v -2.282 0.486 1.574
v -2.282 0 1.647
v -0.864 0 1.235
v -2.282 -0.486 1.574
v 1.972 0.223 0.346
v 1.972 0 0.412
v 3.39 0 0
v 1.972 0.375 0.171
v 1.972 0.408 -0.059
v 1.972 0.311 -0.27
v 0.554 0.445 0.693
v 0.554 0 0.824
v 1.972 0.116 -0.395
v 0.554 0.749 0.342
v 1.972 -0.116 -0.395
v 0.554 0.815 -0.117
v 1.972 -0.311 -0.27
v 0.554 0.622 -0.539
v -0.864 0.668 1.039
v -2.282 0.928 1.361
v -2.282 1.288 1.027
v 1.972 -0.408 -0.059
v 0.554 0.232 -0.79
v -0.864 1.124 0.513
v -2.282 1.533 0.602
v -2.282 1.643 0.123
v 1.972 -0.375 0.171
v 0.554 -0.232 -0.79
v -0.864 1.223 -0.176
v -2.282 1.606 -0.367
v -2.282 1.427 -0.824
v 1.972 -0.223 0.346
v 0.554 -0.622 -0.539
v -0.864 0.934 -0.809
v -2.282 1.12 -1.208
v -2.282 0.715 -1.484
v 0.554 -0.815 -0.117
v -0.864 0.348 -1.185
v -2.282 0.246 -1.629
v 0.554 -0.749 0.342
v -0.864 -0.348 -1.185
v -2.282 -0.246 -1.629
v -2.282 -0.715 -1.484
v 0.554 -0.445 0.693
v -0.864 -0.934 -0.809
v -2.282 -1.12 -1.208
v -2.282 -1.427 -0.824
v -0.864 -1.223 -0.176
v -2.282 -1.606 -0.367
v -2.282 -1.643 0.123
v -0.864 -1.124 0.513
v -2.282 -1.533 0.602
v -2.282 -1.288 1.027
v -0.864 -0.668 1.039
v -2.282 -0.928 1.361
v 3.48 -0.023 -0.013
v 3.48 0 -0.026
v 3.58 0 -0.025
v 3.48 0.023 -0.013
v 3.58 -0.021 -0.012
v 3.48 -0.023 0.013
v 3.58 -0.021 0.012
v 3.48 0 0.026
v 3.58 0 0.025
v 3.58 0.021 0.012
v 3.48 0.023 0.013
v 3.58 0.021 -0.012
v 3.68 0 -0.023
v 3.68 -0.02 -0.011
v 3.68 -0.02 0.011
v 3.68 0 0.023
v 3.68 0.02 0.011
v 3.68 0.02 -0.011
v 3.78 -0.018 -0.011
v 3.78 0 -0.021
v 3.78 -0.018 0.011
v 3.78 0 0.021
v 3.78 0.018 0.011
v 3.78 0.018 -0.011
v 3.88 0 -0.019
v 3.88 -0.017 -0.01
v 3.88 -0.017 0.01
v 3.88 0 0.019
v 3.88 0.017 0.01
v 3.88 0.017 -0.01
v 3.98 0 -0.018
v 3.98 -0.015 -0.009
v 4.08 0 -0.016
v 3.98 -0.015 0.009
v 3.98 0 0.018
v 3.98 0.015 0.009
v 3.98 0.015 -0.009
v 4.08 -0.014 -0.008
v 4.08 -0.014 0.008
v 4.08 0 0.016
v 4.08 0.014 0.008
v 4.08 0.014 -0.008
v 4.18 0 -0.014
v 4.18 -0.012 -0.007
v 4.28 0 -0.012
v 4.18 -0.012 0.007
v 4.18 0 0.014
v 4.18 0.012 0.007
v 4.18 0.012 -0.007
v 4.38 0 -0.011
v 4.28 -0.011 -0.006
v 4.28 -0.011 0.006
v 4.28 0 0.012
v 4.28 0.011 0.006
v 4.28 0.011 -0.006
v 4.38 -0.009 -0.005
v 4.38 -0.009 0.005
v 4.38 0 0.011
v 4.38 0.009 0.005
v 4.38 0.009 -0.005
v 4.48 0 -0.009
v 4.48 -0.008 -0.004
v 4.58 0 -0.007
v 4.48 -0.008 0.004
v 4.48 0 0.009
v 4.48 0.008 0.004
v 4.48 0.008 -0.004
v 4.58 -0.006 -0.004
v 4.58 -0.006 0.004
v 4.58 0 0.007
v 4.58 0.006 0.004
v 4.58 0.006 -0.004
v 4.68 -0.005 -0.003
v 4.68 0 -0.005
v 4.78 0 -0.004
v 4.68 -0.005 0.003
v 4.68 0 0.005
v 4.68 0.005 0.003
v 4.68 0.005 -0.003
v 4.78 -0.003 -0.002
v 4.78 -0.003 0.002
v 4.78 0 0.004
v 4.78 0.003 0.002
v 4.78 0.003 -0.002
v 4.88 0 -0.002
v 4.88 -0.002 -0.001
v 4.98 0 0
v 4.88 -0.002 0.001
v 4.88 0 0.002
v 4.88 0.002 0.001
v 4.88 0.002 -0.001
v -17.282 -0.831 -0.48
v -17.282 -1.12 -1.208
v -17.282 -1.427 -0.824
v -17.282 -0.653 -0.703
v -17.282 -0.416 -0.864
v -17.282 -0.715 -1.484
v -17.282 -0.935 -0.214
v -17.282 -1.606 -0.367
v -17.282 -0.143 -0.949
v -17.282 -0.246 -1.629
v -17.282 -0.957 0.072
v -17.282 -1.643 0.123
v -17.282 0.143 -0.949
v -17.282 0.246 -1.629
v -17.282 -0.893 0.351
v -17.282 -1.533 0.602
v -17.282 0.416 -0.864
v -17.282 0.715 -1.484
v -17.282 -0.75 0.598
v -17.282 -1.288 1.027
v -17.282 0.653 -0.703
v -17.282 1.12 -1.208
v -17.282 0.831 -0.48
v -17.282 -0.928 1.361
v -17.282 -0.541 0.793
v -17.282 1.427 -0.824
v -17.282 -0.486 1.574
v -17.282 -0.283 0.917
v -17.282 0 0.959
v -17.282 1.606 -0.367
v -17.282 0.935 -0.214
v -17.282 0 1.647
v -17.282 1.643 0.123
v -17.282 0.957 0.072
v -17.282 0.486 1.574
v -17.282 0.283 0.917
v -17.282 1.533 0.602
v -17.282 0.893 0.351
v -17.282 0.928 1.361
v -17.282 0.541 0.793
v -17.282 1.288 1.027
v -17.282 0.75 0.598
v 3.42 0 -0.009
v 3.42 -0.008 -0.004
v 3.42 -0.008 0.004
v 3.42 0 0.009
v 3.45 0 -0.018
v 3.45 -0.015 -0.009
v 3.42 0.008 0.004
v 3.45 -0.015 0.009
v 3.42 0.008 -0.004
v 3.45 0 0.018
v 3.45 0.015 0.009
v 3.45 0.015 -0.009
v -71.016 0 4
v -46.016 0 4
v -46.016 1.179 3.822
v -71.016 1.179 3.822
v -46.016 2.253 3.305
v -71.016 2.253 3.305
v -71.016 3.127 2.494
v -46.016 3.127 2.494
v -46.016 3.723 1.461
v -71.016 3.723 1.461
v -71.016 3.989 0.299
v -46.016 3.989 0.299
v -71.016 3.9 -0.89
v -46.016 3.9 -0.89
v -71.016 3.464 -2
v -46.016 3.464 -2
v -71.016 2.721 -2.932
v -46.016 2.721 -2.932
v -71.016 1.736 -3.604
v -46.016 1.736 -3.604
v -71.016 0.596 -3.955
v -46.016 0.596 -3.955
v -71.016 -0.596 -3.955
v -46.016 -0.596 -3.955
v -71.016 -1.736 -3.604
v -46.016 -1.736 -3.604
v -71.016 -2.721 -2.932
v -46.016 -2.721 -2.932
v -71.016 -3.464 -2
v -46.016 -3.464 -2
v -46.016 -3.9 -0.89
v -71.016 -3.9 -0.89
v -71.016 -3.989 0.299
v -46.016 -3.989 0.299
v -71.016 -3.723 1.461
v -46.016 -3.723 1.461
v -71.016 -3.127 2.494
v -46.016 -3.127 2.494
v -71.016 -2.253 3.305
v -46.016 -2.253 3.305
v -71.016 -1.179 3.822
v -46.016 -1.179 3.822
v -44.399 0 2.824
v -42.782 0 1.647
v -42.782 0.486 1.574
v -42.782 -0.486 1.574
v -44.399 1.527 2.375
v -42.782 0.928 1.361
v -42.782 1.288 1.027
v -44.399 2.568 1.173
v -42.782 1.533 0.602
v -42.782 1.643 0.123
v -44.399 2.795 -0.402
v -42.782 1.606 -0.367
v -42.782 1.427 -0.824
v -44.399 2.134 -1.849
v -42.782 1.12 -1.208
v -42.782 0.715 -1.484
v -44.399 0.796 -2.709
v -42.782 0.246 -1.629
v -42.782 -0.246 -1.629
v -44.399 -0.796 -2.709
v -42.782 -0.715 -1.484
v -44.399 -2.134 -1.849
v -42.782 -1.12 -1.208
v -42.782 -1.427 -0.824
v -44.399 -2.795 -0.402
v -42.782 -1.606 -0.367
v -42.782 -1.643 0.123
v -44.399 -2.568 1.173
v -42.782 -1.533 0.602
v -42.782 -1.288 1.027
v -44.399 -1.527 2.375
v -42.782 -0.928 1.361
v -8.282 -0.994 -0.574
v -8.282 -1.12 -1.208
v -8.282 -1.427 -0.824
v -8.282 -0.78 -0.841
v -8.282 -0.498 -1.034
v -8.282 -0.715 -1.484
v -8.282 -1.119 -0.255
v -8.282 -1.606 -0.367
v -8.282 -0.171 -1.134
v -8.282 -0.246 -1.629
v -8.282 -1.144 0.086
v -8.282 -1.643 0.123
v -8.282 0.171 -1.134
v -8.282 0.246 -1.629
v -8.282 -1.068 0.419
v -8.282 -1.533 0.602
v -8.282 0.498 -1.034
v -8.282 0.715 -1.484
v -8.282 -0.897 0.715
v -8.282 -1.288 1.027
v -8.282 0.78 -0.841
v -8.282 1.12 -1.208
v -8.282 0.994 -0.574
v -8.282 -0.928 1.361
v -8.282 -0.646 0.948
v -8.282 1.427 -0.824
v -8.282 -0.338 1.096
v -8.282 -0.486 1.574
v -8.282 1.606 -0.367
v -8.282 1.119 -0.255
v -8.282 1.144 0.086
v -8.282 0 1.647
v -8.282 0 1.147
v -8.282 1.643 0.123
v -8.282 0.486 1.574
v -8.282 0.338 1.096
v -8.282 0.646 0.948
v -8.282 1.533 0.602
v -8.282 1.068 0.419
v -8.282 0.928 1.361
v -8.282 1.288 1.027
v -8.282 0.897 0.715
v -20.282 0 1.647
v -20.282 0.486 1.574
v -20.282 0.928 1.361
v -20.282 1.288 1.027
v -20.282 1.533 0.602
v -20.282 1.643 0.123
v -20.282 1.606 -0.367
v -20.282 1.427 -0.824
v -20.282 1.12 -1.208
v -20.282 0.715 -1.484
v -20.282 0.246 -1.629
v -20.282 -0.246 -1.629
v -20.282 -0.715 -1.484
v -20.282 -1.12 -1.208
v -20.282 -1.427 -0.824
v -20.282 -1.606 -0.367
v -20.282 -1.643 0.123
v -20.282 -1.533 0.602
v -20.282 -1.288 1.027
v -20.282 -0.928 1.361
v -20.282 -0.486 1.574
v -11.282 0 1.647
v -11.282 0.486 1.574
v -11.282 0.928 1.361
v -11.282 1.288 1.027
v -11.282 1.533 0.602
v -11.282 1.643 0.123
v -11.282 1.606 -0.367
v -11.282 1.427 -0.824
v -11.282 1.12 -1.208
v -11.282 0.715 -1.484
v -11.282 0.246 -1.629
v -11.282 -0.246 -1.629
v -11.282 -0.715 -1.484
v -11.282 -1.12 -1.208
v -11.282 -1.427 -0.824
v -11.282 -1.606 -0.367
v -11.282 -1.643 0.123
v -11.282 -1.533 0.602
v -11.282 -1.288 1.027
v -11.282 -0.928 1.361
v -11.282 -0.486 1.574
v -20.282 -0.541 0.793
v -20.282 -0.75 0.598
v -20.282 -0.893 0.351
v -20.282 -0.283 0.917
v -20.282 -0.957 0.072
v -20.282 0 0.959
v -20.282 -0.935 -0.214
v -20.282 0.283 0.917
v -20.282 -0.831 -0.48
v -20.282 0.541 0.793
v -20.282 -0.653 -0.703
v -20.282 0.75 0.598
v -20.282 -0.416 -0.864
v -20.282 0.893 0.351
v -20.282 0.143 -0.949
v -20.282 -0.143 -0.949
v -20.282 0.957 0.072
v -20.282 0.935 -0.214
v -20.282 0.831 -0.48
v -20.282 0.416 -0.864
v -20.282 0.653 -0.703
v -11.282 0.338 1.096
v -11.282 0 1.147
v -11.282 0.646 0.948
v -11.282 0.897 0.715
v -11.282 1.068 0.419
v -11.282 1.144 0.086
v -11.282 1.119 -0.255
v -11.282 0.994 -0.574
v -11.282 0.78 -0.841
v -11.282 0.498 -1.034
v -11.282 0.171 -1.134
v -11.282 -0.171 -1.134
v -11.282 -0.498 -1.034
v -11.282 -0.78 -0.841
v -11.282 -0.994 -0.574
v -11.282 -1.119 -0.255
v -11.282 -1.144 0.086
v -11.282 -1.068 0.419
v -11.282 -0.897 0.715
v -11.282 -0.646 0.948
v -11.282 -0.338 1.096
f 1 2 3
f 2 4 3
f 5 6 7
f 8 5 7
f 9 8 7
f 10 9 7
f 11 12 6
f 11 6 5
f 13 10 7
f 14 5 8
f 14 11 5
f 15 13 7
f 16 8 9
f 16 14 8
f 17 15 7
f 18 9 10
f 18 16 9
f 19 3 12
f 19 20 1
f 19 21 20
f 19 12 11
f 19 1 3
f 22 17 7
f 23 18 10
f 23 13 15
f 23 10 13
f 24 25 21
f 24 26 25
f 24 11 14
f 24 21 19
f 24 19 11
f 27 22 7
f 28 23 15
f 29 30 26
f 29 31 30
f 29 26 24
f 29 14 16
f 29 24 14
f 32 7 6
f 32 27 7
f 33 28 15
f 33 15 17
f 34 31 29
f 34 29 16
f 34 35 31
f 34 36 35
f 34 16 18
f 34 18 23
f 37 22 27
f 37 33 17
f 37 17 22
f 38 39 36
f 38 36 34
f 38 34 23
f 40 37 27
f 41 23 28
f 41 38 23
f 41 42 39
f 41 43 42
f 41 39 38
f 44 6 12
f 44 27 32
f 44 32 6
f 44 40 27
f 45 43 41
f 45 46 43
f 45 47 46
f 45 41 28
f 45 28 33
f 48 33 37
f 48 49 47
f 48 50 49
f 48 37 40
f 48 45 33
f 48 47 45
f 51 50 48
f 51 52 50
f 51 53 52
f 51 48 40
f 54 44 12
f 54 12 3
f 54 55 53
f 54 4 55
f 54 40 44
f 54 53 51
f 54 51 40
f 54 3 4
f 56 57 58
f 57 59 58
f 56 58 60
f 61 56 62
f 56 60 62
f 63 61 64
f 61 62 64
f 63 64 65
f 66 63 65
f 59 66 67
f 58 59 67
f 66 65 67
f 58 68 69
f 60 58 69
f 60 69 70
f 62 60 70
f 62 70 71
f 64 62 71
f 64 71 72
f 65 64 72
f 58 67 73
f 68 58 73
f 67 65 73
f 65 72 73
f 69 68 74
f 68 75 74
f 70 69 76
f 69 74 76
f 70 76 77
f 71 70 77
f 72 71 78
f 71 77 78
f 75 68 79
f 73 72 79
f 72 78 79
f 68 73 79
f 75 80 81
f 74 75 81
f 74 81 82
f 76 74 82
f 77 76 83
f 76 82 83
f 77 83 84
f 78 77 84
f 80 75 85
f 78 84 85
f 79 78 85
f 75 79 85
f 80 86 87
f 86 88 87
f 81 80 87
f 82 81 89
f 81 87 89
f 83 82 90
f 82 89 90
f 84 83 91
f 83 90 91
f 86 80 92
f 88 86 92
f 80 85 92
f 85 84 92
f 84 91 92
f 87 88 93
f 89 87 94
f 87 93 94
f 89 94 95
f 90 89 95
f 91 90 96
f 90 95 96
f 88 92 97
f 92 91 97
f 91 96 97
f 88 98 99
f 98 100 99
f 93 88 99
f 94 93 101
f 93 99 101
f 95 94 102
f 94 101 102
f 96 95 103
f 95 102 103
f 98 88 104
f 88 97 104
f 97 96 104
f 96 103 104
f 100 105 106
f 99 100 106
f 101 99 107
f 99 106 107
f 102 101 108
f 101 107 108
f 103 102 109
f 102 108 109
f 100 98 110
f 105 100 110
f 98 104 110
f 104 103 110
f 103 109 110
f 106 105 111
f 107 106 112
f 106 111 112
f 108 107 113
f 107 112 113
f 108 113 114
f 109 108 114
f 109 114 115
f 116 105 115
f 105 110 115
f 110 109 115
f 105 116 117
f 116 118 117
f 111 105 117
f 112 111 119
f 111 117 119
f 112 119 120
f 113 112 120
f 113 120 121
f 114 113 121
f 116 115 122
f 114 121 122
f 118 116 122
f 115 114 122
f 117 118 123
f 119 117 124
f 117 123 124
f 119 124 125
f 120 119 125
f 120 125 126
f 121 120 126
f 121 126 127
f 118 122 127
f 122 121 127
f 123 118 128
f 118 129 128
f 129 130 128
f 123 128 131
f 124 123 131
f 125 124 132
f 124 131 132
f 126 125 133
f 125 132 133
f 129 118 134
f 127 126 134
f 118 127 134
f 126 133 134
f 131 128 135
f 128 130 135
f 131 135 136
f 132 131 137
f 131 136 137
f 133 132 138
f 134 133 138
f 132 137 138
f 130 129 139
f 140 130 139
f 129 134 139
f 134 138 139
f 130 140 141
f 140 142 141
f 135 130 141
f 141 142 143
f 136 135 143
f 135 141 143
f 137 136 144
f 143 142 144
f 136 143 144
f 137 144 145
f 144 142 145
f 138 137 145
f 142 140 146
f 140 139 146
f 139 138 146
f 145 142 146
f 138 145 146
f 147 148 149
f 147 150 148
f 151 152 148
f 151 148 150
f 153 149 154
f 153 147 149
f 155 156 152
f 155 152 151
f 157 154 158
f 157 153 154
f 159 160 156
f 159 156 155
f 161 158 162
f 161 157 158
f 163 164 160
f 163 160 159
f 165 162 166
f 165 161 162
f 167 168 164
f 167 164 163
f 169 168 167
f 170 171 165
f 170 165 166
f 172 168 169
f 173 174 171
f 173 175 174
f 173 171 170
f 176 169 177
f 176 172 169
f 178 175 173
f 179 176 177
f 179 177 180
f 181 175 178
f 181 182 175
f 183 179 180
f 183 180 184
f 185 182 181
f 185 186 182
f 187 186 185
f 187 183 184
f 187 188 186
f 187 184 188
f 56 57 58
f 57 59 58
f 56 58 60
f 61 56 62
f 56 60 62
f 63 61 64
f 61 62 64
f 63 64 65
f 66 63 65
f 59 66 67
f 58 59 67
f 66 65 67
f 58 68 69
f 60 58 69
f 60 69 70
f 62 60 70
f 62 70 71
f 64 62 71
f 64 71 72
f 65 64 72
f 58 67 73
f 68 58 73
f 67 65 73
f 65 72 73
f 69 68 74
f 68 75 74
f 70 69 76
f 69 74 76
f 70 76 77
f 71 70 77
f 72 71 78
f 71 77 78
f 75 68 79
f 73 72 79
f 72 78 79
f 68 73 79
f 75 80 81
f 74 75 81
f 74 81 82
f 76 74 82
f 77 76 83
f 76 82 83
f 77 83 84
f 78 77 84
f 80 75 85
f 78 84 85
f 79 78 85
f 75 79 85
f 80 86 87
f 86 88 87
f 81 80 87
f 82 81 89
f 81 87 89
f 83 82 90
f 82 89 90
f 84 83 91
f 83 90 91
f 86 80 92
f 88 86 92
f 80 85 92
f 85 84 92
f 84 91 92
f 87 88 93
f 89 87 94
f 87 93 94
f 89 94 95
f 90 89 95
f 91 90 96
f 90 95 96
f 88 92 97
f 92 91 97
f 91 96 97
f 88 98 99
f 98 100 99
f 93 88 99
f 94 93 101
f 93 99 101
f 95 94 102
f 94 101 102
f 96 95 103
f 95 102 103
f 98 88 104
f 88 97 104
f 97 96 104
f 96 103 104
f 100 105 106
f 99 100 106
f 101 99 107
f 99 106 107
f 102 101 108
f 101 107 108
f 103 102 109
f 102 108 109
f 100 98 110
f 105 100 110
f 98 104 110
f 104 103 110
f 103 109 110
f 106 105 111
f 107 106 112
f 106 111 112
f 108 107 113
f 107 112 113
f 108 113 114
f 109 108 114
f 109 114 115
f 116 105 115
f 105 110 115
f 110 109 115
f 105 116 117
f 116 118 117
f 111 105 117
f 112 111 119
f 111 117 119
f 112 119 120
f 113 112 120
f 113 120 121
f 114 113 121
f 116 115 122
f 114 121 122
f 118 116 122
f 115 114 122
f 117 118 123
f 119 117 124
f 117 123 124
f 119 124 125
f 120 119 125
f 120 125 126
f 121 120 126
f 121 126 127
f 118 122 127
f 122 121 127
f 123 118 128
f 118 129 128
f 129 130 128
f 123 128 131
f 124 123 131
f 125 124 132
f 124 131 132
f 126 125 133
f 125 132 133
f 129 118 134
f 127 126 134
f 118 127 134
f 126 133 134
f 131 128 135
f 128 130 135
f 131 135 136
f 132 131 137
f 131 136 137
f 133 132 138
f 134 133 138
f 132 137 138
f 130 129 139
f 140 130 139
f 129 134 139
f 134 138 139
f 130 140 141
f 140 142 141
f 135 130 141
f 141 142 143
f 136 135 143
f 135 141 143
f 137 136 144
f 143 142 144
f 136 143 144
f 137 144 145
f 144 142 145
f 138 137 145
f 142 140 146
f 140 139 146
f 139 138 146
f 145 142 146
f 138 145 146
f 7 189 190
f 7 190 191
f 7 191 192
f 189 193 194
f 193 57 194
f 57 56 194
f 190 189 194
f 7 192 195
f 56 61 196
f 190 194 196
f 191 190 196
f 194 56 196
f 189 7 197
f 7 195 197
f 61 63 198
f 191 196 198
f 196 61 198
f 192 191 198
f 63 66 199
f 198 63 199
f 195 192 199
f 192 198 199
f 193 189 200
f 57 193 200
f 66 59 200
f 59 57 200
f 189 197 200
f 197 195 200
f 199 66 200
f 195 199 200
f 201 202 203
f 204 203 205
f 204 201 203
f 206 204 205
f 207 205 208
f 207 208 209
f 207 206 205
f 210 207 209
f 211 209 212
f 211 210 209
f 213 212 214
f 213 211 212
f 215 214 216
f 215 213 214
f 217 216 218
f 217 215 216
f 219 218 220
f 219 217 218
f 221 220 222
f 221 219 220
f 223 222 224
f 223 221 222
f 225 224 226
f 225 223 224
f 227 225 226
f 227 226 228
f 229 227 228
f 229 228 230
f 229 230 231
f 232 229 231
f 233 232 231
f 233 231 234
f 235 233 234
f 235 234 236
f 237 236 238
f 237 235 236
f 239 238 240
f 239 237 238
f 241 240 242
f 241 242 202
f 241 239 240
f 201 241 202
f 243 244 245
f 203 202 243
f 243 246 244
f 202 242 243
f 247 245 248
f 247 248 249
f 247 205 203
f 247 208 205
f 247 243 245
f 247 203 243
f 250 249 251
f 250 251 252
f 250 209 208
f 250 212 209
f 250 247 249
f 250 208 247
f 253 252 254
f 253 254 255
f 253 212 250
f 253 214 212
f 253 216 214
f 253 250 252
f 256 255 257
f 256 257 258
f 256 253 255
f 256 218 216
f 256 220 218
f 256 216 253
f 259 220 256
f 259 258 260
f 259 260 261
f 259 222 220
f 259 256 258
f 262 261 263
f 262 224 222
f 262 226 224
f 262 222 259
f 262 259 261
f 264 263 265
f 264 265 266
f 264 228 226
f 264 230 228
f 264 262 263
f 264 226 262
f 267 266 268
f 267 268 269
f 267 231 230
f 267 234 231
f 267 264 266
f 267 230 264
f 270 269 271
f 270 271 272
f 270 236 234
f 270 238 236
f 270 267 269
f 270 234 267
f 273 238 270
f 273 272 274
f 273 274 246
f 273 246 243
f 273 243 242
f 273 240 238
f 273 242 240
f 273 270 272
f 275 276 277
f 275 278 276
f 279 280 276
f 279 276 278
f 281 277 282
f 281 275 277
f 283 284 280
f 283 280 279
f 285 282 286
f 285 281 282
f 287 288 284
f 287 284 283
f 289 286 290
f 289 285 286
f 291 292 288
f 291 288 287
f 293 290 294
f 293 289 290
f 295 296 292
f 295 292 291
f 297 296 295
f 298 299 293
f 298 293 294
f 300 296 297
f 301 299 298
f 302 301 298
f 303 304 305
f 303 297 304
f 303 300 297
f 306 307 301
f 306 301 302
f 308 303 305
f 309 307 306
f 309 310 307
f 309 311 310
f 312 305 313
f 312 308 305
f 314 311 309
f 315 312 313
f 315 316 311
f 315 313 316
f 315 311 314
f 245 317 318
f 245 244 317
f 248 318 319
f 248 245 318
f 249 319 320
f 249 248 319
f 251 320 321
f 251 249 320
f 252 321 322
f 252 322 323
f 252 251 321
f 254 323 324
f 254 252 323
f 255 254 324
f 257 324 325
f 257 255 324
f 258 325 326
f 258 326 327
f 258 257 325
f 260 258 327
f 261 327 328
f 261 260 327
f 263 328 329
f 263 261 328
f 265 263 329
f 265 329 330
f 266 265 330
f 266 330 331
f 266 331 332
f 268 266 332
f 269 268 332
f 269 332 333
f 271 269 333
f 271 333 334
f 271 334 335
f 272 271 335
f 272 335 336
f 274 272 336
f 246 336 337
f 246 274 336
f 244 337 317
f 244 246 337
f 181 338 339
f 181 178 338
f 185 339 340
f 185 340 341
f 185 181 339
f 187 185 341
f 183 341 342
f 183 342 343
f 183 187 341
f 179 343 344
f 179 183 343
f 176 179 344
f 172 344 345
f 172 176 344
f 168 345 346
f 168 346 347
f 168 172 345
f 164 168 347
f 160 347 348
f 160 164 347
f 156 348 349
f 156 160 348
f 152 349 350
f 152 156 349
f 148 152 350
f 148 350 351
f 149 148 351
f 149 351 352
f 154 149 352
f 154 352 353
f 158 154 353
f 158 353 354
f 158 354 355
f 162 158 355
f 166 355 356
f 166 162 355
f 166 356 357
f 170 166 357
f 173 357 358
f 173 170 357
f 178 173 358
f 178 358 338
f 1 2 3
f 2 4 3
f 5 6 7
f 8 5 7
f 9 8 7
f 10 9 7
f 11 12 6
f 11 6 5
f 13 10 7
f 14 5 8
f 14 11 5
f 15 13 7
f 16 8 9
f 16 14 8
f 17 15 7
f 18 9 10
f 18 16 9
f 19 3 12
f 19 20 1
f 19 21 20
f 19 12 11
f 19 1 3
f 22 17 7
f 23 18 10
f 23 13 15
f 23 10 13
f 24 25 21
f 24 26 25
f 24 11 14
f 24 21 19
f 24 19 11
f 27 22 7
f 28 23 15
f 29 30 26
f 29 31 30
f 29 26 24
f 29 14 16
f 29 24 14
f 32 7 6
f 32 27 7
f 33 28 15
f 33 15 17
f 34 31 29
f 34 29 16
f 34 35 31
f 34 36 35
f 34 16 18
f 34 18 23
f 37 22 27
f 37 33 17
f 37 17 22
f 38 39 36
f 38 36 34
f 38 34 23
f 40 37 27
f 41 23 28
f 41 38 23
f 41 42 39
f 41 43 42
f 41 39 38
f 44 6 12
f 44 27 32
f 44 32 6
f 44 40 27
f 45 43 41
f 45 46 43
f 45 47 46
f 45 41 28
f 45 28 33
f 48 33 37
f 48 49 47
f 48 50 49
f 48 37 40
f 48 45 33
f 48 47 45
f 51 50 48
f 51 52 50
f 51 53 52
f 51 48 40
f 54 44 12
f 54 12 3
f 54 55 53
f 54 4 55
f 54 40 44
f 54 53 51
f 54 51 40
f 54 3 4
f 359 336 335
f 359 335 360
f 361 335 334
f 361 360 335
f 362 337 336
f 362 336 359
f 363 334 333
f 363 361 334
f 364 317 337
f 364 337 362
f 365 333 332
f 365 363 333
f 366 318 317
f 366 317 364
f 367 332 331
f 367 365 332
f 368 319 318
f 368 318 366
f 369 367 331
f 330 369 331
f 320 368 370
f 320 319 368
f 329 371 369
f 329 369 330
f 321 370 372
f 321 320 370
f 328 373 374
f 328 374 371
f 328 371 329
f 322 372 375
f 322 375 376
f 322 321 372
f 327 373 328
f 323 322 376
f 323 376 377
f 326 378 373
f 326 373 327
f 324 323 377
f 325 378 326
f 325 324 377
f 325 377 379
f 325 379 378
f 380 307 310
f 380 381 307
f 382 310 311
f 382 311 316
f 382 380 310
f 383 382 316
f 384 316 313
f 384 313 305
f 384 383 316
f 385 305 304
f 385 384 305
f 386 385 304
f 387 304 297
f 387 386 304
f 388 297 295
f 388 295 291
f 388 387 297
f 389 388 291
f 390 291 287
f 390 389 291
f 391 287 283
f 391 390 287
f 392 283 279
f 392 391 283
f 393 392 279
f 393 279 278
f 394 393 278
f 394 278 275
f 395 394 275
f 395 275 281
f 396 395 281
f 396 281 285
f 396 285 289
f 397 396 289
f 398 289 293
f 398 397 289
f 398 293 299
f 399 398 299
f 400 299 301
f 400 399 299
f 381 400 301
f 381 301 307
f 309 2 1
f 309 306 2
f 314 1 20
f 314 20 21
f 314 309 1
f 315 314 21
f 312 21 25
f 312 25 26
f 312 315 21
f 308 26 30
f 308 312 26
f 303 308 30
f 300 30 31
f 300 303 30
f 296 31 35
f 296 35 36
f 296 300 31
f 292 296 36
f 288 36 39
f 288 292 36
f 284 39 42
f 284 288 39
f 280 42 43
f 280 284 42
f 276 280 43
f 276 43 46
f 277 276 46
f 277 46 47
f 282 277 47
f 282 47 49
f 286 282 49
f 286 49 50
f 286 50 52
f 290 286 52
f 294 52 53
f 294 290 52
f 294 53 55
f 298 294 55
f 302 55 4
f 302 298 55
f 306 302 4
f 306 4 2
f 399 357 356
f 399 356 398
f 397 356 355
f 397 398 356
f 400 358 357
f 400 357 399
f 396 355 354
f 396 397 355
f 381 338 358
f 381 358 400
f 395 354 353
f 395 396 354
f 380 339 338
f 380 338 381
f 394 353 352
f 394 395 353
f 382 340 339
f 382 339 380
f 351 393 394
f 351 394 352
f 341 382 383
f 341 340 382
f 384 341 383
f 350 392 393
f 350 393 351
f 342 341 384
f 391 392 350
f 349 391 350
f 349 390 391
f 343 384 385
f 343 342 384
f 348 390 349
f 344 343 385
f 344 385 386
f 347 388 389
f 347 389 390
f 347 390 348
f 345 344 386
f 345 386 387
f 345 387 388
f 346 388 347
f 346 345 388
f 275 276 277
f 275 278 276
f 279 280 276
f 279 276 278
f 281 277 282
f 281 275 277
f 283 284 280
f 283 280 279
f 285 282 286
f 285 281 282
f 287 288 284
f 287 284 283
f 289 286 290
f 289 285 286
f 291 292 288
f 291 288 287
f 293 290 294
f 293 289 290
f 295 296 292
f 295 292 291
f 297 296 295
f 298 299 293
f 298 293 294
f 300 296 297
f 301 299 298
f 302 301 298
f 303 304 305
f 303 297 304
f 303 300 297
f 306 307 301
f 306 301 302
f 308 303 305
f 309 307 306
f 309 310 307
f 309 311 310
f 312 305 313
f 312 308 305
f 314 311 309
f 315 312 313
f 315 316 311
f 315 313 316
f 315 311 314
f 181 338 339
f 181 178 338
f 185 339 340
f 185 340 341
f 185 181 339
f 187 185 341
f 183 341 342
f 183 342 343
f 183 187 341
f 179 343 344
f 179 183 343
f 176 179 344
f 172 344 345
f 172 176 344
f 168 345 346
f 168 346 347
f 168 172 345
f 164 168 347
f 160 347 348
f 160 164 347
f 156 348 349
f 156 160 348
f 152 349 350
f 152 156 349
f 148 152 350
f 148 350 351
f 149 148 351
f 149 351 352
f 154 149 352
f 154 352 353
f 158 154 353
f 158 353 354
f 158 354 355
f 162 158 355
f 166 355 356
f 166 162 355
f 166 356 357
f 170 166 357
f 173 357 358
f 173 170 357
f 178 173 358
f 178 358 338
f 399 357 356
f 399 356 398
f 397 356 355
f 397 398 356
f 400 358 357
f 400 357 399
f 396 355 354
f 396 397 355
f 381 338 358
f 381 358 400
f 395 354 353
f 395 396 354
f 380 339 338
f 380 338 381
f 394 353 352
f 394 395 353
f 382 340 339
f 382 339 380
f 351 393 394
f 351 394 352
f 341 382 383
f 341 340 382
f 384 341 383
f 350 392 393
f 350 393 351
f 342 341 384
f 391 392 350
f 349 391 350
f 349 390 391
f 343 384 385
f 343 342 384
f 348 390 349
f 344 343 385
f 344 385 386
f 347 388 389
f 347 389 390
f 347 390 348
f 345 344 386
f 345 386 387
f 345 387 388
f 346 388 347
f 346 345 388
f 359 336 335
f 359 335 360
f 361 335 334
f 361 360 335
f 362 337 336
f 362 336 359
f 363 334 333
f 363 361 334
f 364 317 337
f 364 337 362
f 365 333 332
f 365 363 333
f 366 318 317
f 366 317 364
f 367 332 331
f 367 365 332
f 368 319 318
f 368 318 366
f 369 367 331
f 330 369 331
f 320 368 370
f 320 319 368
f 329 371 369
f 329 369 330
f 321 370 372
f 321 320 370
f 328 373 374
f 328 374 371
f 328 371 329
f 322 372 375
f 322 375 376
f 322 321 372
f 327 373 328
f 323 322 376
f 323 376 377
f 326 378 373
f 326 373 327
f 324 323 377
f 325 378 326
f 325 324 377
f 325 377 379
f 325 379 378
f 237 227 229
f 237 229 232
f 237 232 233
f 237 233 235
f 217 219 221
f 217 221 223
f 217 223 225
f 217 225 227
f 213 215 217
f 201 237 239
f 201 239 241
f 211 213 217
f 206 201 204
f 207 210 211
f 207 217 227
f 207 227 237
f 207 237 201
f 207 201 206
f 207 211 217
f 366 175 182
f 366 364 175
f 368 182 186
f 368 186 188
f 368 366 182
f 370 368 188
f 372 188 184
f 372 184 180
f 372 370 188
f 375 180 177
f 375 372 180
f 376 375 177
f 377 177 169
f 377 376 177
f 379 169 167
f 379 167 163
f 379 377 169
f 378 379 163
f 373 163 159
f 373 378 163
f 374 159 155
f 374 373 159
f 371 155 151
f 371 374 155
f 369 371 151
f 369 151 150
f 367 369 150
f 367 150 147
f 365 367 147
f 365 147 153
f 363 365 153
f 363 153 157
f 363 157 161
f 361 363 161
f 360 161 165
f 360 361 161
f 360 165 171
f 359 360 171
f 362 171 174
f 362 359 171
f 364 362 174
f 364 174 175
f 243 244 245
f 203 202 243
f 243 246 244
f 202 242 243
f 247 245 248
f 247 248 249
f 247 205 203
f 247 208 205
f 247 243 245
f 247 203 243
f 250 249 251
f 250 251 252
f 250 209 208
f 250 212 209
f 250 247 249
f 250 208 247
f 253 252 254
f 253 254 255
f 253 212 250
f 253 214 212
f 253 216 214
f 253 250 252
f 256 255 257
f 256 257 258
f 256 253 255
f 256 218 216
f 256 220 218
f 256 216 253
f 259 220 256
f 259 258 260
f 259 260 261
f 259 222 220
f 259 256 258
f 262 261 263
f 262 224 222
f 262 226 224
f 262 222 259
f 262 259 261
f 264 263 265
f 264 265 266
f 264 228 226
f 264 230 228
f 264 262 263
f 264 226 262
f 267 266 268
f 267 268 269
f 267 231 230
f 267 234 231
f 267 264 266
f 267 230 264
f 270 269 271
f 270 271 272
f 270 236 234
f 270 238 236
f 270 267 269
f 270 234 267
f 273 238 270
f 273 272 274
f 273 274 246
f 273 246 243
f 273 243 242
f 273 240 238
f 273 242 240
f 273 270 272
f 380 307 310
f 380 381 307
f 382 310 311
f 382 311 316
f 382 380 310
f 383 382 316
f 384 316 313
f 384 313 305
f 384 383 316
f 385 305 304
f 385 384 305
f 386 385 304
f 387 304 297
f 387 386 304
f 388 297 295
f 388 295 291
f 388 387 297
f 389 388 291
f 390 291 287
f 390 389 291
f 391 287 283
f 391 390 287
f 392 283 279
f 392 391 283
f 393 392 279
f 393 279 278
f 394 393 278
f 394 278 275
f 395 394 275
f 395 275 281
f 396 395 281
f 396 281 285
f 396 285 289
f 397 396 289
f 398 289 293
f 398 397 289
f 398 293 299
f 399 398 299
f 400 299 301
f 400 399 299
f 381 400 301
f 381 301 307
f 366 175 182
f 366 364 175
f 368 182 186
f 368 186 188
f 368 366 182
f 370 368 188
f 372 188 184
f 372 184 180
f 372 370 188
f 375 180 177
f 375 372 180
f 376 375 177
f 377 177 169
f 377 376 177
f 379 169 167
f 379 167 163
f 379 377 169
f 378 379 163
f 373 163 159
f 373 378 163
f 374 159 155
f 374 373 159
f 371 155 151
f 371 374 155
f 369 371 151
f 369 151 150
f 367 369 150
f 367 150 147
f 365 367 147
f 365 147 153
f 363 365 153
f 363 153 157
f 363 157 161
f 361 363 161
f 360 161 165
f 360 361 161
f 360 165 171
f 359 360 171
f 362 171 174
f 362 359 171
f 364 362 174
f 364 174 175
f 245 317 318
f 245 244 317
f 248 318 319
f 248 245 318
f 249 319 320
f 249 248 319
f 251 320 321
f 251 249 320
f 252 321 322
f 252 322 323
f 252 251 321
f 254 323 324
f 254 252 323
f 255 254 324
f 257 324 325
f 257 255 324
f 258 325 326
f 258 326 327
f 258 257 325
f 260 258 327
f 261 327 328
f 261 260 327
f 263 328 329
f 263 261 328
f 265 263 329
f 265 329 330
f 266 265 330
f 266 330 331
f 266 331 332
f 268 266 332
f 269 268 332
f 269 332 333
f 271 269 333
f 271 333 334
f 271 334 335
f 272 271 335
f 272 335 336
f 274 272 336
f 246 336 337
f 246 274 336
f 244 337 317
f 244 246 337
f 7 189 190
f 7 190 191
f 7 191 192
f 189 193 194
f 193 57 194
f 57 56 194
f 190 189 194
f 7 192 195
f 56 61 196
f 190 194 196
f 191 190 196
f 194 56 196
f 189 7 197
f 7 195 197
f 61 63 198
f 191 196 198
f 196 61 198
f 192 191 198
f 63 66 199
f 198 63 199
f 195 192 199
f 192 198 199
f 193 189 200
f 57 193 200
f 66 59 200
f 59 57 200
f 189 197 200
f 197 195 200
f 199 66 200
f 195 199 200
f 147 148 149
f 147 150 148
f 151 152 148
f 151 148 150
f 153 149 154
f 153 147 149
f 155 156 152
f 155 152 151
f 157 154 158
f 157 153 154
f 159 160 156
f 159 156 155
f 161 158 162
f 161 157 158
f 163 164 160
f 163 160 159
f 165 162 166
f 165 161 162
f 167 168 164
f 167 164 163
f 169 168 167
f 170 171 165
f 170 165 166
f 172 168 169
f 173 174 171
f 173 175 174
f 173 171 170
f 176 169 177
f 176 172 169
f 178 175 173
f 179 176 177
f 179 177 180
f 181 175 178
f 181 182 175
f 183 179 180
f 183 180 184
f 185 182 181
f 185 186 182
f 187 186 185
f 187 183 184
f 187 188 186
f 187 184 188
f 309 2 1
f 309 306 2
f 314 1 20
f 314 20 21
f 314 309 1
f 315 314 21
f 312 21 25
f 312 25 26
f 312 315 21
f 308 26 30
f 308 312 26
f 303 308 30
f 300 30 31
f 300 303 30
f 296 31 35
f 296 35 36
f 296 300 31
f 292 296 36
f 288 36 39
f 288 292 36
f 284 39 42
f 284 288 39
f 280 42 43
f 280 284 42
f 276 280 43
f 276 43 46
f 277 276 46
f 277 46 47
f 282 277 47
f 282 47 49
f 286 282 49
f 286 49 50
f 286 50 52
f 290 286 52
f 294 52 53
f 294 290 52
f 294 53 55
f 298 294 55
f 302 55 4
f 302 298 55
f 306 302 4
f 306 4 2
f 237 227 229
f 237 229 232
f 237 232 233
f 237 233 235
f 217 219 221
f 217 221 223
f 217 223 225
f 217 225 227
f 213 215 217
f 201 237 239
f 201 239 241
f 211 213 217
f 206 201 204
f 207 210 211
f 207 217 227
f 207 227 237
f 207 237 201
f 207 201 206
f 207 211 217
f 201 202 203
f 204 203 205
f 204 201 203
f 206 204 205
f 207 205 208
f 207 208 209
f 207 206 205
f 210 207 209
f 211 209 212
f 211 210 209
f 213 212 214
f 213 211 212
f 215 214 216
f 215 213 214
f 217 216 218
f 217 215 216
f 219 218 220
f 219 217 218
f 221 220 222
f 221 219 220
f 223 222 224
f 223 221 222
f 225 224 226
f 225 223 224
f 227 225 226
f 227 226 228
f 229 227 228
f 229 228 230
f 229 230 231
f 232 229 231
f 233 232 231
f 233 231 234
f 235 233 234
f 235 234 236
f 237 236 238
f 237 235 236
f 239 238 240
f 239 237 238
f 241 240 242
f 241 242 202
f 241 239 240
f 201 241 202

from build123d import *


with BuildPart() as f1:
    # F0 (on Front) → F1 (revolve)
    with BuildSketch(Plane.XZ):
        Polygon((4.980334, 0), (3.389877, 0), (3.480334, -0.026274), align=None)
        Polygon((-71.016478, 4), (-71.016478, 0), (3.389877, 0), (-2.281533, 1.647314), (-8.281533, 1.647314), (-8.281533, 1.147314), (-11.281533, 1.147314), (-11.281533, 1.647314), (-17.281533, 1.647314), (-17.281533, 0.959492), (-20.281533, 0.959492), (-20.281533, 1.647314), (-42.781533, 1.647314), (-46.016478, 4), align=None)
    revolve(axis=Axis((-33.018072, 0, 0), (-1, 0, 0)))


with BuildPart() as f2:
    # F0 (on Front) → F2 (revolve)
    with BuildSketch(Plane.XZ):
        Polygon((4.980334, 0), (3.389877, 0), (3.480334, -0.026274), align=None)
        Polygon((-71.016478, 4), (-71.016478, 0), (3.389877, 0), (-2.281533, 1.647314), (-8.281533, 1.647314), (-8.281533, 1.147314), (-11.281533, 1.147314), (-11.281533, 1.647314), (-17.281533, 1.647314), (-17.281533, 0.959492), (-20.281533, 0.959492), (-20.281533, 1.647314), (-42.781533, 1.647314), (-46.016478, 4), align=None)
    revolve(axis=Axis((-46.016478, 0, 0), (-1, 0, 0)))


solid = Compound([f1.part, f2.part])
